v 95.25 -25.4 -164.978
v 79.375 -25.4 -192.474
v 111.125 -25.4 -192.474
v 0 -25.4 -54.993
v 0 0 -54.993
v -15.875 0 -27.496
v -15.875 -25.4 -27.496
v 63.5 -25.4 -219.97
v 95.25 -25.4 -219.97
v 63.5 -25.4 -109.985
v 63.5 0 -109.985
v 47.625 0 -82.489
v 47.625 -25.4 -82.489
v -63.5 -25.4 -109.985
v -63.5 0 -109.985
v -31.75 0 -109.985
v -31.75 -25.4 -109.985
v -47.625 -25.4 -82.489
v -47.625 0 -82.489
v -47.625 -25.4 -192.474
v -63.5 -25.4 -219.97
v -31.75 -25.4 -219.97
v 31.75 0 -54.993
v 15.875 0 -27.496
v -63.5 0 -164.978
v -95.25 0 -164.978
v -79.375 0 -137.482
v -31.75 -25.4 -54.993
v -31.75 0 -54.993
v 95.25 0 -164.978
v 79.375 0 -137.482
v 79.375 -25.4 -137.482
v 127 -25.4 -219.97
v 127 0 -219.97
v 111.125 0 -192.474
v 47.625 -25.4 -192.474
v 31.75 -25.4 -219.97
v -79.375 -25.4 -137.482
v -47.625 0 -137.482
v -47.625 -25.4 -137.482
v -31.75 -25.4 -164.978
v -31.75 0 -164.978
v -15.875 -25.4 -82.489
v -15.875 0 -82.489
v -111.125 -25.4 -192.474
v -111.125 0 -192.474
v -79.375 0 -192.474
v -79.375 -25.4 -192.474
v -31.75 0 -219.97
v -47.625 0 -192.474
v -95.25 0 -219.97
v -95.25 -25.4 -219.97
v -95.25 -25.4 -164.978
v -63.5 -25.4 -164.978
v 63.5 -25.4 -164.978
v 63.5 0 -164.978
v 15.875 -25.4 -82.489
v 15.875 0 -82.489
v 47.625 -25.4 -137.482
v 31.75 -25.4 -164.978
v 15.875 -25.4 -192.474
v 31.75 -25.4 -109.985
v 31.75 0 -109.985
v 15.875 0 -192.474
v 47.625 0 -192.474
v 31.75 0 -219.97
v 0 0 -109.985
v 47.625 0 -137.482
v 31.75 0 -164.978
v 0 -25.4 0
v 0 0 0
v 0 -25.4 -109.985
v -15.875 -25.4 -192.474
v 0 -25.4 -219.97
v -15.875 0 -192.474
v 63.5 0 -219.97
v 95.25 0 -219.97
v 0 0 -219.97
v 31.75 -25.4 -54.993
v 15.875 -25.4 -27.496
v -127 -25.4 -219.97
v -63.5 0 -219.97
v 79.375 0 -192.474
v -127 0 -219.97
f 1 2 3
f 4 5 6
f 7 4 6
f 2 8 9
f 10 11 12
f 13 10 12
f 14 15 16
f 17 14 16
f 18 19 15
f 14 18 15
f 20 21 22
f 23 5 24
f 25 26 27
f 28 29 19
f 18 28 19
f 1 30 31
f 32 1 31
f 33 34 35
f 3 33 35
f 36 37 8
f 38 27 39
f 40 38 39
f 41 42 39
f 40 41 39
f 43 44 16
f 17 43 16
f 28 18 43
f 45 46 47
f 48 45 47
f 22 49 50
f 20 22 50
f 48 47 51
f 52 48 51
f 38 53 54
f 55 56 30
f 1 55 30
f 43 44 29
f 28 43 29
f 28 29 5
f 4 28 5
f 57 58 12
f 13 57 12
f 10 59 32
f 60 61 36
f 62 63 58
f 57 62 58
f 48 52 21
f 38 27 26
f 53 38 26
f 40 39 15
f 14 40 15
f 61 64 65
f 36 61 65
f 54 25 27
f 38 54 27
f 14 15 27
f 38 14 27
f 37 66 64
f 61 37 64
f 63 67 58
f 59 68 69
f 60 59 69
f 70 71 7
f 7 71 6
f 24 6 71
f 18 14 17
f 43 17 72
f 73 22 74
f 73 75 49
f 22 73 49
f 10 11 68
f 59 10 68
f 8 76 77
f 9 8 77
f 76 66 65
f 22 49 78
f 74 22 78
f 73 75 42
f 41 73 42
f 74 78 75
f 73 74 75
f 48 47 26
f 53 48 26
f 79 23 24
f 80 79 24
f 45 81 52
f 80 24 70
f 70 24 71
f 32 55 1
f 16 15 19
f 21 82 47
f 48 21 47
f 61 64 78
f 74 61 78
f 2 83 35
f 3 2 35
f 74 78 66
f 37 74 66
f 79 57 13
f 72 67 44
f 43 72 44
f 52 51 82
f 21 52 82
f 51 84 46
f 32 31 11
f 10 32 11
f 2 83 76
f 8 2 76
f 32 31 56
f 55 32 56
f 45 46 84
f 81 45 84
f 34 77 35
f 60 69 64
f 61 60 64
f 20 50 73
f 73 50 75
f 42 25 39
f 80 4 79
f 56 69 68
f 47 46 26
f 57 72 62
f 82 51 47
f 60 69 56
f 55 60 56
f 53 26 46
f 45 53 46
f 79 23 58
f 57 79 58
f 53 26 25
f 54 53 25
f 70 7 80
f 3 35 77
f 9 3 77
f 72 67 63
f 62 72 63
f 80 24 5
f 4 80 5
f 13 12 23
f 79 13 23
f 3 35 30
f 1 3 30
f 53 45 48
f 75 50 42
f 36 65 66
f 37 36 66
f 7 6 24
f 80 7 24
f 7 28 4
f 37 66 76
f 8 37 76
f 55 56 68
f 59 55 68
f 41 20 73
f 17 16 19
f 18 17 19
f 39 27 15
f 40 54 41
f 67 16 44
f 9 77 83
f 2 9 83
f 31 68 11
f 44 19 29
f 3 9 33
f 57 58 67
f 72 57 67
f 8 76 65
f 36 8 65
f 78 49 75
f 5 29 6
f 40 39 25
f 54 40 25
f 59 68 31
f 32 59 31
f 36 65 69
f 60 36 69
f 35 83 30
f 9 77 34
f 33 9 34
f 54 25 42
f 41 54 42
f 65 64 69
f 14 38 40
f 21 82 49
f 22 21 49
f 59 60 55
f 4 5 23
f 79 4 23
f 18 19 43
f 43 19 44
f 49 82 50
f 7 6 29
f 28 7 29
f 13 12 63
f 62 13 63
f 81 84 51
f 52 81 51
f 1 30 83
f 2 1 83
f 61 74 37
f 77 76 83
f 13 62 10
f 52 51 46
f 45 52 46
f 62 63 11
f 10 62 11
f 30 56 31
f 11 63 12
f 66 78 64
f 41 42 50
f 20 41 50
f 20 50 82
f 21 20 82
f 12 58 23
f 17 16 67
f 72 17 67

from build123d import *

# Parameters (mm, degrees)
F1_DEPTH = 25.4


with BuildPart() as f1:
    # F0 (on Front) → F1 (new body)
    with BuildSketch(Plane.XZ):
        Polygon((15.875, -27.496307), (0, 0), (-15.875, -27.496307), align=None)
        Polygon((0, -54.992613), (-15.875, -27.496307), (-31.75, -54.992613), align=None)
        Polygon((31.75, -54.992613), (15.875, -27.496307), (0, -54.992613), align=None)
        Polygon((-15.875, -82.48892), (-31.75, -54.992613), (-47.625, -82.48892), align=None)
        Polygon((-31.75, -109.985226), (-47.625, -82.48892), (-63.5, -109.985226), align=None)
        Polygon((0, -109.985226), (-15.875, -82.48892), (-31.75, -109.985226), align=None)
        Polygon((31.75, -109.985226), (15.875, -82.48892), (0, -109.985226), align=None)
        Polygon((47.625, -82.48892), (31.75, -54.992613), (15.875, -82.48892), align=None)
        Polygon((63.5, -109.985226), (47.625, -82.48892), (31.75, -109.985226), align=None)
        Polygon((79.375, -137.481533), (63.5, -109.985226), (47.625, -137.481533), align=None)
        Polygon((63.5, -164.977839), (47.625, -137.481533), (31.75, -164.977839), align=None)
        Polygon((95.25, -164.977839), (79.375, -137.481533), (63.5, -164.977839), align=None)
        Polygon((111.125, -192.474146), (95.25, -164.977839), (79.375, -192.474146), align=None)
        Polygon((95.25, -219.970453), (79.375, -192.474146), (63.5, -219.970453), align=None)
        Polygon((127, -219.970453), (111.125, -192.474146), (95.25, -219.970453), align=None)
        Polygon((47.625, -192.474146), (31.75, -164.977839), (15.875, -192.474146), align=None)
        Polygon((63.5, -219.970453), (47.625, -192.474146), (31.75, -219.970453), align=None)
        Polygon((31.75, -219.970453), (15.875, -192.474146), (0, -219.970453), align=None)
        Polygon((0, -219.970453), (-15.875, -192.474146), (-31.75, -219.970453), align=None)
        Polygon((-15.875, -192.474146), (-31.75, -164.977839), (-47.625, -192.474146), align=None)
        Polygon((-31.75, -219.970453), (-47.625, -192.474146), (-63.5, -219.970453), align=None)
        Polygon((-63.5, -219.970453), (-79.375, -192.474146), (-95.25, -219.970453), align=None)
        Polygon((-95.25, -219.970453), (-111.125, -192.474146), (-127, -219.970453), align=None)
        Polygon((-79.375, -192.474146), (-95.25, -164.977839), (-111.125, -192.474146), align=None)
        Polygon((-63.5, -164.977839), (-79.375, -137.481533), (-95.25, -164.977839), align=None)
        Polygon((-31.75, -164.977839), (-47.625, -137.481533), (-63.5, -164.977839), align=None)
        Polygon((-47.625, -137.481533), (-63.5, -109.985226), (-79.375, -137.481533), align=None)
    extrude(amount=F1_DEPTH)


solid = f1.part
